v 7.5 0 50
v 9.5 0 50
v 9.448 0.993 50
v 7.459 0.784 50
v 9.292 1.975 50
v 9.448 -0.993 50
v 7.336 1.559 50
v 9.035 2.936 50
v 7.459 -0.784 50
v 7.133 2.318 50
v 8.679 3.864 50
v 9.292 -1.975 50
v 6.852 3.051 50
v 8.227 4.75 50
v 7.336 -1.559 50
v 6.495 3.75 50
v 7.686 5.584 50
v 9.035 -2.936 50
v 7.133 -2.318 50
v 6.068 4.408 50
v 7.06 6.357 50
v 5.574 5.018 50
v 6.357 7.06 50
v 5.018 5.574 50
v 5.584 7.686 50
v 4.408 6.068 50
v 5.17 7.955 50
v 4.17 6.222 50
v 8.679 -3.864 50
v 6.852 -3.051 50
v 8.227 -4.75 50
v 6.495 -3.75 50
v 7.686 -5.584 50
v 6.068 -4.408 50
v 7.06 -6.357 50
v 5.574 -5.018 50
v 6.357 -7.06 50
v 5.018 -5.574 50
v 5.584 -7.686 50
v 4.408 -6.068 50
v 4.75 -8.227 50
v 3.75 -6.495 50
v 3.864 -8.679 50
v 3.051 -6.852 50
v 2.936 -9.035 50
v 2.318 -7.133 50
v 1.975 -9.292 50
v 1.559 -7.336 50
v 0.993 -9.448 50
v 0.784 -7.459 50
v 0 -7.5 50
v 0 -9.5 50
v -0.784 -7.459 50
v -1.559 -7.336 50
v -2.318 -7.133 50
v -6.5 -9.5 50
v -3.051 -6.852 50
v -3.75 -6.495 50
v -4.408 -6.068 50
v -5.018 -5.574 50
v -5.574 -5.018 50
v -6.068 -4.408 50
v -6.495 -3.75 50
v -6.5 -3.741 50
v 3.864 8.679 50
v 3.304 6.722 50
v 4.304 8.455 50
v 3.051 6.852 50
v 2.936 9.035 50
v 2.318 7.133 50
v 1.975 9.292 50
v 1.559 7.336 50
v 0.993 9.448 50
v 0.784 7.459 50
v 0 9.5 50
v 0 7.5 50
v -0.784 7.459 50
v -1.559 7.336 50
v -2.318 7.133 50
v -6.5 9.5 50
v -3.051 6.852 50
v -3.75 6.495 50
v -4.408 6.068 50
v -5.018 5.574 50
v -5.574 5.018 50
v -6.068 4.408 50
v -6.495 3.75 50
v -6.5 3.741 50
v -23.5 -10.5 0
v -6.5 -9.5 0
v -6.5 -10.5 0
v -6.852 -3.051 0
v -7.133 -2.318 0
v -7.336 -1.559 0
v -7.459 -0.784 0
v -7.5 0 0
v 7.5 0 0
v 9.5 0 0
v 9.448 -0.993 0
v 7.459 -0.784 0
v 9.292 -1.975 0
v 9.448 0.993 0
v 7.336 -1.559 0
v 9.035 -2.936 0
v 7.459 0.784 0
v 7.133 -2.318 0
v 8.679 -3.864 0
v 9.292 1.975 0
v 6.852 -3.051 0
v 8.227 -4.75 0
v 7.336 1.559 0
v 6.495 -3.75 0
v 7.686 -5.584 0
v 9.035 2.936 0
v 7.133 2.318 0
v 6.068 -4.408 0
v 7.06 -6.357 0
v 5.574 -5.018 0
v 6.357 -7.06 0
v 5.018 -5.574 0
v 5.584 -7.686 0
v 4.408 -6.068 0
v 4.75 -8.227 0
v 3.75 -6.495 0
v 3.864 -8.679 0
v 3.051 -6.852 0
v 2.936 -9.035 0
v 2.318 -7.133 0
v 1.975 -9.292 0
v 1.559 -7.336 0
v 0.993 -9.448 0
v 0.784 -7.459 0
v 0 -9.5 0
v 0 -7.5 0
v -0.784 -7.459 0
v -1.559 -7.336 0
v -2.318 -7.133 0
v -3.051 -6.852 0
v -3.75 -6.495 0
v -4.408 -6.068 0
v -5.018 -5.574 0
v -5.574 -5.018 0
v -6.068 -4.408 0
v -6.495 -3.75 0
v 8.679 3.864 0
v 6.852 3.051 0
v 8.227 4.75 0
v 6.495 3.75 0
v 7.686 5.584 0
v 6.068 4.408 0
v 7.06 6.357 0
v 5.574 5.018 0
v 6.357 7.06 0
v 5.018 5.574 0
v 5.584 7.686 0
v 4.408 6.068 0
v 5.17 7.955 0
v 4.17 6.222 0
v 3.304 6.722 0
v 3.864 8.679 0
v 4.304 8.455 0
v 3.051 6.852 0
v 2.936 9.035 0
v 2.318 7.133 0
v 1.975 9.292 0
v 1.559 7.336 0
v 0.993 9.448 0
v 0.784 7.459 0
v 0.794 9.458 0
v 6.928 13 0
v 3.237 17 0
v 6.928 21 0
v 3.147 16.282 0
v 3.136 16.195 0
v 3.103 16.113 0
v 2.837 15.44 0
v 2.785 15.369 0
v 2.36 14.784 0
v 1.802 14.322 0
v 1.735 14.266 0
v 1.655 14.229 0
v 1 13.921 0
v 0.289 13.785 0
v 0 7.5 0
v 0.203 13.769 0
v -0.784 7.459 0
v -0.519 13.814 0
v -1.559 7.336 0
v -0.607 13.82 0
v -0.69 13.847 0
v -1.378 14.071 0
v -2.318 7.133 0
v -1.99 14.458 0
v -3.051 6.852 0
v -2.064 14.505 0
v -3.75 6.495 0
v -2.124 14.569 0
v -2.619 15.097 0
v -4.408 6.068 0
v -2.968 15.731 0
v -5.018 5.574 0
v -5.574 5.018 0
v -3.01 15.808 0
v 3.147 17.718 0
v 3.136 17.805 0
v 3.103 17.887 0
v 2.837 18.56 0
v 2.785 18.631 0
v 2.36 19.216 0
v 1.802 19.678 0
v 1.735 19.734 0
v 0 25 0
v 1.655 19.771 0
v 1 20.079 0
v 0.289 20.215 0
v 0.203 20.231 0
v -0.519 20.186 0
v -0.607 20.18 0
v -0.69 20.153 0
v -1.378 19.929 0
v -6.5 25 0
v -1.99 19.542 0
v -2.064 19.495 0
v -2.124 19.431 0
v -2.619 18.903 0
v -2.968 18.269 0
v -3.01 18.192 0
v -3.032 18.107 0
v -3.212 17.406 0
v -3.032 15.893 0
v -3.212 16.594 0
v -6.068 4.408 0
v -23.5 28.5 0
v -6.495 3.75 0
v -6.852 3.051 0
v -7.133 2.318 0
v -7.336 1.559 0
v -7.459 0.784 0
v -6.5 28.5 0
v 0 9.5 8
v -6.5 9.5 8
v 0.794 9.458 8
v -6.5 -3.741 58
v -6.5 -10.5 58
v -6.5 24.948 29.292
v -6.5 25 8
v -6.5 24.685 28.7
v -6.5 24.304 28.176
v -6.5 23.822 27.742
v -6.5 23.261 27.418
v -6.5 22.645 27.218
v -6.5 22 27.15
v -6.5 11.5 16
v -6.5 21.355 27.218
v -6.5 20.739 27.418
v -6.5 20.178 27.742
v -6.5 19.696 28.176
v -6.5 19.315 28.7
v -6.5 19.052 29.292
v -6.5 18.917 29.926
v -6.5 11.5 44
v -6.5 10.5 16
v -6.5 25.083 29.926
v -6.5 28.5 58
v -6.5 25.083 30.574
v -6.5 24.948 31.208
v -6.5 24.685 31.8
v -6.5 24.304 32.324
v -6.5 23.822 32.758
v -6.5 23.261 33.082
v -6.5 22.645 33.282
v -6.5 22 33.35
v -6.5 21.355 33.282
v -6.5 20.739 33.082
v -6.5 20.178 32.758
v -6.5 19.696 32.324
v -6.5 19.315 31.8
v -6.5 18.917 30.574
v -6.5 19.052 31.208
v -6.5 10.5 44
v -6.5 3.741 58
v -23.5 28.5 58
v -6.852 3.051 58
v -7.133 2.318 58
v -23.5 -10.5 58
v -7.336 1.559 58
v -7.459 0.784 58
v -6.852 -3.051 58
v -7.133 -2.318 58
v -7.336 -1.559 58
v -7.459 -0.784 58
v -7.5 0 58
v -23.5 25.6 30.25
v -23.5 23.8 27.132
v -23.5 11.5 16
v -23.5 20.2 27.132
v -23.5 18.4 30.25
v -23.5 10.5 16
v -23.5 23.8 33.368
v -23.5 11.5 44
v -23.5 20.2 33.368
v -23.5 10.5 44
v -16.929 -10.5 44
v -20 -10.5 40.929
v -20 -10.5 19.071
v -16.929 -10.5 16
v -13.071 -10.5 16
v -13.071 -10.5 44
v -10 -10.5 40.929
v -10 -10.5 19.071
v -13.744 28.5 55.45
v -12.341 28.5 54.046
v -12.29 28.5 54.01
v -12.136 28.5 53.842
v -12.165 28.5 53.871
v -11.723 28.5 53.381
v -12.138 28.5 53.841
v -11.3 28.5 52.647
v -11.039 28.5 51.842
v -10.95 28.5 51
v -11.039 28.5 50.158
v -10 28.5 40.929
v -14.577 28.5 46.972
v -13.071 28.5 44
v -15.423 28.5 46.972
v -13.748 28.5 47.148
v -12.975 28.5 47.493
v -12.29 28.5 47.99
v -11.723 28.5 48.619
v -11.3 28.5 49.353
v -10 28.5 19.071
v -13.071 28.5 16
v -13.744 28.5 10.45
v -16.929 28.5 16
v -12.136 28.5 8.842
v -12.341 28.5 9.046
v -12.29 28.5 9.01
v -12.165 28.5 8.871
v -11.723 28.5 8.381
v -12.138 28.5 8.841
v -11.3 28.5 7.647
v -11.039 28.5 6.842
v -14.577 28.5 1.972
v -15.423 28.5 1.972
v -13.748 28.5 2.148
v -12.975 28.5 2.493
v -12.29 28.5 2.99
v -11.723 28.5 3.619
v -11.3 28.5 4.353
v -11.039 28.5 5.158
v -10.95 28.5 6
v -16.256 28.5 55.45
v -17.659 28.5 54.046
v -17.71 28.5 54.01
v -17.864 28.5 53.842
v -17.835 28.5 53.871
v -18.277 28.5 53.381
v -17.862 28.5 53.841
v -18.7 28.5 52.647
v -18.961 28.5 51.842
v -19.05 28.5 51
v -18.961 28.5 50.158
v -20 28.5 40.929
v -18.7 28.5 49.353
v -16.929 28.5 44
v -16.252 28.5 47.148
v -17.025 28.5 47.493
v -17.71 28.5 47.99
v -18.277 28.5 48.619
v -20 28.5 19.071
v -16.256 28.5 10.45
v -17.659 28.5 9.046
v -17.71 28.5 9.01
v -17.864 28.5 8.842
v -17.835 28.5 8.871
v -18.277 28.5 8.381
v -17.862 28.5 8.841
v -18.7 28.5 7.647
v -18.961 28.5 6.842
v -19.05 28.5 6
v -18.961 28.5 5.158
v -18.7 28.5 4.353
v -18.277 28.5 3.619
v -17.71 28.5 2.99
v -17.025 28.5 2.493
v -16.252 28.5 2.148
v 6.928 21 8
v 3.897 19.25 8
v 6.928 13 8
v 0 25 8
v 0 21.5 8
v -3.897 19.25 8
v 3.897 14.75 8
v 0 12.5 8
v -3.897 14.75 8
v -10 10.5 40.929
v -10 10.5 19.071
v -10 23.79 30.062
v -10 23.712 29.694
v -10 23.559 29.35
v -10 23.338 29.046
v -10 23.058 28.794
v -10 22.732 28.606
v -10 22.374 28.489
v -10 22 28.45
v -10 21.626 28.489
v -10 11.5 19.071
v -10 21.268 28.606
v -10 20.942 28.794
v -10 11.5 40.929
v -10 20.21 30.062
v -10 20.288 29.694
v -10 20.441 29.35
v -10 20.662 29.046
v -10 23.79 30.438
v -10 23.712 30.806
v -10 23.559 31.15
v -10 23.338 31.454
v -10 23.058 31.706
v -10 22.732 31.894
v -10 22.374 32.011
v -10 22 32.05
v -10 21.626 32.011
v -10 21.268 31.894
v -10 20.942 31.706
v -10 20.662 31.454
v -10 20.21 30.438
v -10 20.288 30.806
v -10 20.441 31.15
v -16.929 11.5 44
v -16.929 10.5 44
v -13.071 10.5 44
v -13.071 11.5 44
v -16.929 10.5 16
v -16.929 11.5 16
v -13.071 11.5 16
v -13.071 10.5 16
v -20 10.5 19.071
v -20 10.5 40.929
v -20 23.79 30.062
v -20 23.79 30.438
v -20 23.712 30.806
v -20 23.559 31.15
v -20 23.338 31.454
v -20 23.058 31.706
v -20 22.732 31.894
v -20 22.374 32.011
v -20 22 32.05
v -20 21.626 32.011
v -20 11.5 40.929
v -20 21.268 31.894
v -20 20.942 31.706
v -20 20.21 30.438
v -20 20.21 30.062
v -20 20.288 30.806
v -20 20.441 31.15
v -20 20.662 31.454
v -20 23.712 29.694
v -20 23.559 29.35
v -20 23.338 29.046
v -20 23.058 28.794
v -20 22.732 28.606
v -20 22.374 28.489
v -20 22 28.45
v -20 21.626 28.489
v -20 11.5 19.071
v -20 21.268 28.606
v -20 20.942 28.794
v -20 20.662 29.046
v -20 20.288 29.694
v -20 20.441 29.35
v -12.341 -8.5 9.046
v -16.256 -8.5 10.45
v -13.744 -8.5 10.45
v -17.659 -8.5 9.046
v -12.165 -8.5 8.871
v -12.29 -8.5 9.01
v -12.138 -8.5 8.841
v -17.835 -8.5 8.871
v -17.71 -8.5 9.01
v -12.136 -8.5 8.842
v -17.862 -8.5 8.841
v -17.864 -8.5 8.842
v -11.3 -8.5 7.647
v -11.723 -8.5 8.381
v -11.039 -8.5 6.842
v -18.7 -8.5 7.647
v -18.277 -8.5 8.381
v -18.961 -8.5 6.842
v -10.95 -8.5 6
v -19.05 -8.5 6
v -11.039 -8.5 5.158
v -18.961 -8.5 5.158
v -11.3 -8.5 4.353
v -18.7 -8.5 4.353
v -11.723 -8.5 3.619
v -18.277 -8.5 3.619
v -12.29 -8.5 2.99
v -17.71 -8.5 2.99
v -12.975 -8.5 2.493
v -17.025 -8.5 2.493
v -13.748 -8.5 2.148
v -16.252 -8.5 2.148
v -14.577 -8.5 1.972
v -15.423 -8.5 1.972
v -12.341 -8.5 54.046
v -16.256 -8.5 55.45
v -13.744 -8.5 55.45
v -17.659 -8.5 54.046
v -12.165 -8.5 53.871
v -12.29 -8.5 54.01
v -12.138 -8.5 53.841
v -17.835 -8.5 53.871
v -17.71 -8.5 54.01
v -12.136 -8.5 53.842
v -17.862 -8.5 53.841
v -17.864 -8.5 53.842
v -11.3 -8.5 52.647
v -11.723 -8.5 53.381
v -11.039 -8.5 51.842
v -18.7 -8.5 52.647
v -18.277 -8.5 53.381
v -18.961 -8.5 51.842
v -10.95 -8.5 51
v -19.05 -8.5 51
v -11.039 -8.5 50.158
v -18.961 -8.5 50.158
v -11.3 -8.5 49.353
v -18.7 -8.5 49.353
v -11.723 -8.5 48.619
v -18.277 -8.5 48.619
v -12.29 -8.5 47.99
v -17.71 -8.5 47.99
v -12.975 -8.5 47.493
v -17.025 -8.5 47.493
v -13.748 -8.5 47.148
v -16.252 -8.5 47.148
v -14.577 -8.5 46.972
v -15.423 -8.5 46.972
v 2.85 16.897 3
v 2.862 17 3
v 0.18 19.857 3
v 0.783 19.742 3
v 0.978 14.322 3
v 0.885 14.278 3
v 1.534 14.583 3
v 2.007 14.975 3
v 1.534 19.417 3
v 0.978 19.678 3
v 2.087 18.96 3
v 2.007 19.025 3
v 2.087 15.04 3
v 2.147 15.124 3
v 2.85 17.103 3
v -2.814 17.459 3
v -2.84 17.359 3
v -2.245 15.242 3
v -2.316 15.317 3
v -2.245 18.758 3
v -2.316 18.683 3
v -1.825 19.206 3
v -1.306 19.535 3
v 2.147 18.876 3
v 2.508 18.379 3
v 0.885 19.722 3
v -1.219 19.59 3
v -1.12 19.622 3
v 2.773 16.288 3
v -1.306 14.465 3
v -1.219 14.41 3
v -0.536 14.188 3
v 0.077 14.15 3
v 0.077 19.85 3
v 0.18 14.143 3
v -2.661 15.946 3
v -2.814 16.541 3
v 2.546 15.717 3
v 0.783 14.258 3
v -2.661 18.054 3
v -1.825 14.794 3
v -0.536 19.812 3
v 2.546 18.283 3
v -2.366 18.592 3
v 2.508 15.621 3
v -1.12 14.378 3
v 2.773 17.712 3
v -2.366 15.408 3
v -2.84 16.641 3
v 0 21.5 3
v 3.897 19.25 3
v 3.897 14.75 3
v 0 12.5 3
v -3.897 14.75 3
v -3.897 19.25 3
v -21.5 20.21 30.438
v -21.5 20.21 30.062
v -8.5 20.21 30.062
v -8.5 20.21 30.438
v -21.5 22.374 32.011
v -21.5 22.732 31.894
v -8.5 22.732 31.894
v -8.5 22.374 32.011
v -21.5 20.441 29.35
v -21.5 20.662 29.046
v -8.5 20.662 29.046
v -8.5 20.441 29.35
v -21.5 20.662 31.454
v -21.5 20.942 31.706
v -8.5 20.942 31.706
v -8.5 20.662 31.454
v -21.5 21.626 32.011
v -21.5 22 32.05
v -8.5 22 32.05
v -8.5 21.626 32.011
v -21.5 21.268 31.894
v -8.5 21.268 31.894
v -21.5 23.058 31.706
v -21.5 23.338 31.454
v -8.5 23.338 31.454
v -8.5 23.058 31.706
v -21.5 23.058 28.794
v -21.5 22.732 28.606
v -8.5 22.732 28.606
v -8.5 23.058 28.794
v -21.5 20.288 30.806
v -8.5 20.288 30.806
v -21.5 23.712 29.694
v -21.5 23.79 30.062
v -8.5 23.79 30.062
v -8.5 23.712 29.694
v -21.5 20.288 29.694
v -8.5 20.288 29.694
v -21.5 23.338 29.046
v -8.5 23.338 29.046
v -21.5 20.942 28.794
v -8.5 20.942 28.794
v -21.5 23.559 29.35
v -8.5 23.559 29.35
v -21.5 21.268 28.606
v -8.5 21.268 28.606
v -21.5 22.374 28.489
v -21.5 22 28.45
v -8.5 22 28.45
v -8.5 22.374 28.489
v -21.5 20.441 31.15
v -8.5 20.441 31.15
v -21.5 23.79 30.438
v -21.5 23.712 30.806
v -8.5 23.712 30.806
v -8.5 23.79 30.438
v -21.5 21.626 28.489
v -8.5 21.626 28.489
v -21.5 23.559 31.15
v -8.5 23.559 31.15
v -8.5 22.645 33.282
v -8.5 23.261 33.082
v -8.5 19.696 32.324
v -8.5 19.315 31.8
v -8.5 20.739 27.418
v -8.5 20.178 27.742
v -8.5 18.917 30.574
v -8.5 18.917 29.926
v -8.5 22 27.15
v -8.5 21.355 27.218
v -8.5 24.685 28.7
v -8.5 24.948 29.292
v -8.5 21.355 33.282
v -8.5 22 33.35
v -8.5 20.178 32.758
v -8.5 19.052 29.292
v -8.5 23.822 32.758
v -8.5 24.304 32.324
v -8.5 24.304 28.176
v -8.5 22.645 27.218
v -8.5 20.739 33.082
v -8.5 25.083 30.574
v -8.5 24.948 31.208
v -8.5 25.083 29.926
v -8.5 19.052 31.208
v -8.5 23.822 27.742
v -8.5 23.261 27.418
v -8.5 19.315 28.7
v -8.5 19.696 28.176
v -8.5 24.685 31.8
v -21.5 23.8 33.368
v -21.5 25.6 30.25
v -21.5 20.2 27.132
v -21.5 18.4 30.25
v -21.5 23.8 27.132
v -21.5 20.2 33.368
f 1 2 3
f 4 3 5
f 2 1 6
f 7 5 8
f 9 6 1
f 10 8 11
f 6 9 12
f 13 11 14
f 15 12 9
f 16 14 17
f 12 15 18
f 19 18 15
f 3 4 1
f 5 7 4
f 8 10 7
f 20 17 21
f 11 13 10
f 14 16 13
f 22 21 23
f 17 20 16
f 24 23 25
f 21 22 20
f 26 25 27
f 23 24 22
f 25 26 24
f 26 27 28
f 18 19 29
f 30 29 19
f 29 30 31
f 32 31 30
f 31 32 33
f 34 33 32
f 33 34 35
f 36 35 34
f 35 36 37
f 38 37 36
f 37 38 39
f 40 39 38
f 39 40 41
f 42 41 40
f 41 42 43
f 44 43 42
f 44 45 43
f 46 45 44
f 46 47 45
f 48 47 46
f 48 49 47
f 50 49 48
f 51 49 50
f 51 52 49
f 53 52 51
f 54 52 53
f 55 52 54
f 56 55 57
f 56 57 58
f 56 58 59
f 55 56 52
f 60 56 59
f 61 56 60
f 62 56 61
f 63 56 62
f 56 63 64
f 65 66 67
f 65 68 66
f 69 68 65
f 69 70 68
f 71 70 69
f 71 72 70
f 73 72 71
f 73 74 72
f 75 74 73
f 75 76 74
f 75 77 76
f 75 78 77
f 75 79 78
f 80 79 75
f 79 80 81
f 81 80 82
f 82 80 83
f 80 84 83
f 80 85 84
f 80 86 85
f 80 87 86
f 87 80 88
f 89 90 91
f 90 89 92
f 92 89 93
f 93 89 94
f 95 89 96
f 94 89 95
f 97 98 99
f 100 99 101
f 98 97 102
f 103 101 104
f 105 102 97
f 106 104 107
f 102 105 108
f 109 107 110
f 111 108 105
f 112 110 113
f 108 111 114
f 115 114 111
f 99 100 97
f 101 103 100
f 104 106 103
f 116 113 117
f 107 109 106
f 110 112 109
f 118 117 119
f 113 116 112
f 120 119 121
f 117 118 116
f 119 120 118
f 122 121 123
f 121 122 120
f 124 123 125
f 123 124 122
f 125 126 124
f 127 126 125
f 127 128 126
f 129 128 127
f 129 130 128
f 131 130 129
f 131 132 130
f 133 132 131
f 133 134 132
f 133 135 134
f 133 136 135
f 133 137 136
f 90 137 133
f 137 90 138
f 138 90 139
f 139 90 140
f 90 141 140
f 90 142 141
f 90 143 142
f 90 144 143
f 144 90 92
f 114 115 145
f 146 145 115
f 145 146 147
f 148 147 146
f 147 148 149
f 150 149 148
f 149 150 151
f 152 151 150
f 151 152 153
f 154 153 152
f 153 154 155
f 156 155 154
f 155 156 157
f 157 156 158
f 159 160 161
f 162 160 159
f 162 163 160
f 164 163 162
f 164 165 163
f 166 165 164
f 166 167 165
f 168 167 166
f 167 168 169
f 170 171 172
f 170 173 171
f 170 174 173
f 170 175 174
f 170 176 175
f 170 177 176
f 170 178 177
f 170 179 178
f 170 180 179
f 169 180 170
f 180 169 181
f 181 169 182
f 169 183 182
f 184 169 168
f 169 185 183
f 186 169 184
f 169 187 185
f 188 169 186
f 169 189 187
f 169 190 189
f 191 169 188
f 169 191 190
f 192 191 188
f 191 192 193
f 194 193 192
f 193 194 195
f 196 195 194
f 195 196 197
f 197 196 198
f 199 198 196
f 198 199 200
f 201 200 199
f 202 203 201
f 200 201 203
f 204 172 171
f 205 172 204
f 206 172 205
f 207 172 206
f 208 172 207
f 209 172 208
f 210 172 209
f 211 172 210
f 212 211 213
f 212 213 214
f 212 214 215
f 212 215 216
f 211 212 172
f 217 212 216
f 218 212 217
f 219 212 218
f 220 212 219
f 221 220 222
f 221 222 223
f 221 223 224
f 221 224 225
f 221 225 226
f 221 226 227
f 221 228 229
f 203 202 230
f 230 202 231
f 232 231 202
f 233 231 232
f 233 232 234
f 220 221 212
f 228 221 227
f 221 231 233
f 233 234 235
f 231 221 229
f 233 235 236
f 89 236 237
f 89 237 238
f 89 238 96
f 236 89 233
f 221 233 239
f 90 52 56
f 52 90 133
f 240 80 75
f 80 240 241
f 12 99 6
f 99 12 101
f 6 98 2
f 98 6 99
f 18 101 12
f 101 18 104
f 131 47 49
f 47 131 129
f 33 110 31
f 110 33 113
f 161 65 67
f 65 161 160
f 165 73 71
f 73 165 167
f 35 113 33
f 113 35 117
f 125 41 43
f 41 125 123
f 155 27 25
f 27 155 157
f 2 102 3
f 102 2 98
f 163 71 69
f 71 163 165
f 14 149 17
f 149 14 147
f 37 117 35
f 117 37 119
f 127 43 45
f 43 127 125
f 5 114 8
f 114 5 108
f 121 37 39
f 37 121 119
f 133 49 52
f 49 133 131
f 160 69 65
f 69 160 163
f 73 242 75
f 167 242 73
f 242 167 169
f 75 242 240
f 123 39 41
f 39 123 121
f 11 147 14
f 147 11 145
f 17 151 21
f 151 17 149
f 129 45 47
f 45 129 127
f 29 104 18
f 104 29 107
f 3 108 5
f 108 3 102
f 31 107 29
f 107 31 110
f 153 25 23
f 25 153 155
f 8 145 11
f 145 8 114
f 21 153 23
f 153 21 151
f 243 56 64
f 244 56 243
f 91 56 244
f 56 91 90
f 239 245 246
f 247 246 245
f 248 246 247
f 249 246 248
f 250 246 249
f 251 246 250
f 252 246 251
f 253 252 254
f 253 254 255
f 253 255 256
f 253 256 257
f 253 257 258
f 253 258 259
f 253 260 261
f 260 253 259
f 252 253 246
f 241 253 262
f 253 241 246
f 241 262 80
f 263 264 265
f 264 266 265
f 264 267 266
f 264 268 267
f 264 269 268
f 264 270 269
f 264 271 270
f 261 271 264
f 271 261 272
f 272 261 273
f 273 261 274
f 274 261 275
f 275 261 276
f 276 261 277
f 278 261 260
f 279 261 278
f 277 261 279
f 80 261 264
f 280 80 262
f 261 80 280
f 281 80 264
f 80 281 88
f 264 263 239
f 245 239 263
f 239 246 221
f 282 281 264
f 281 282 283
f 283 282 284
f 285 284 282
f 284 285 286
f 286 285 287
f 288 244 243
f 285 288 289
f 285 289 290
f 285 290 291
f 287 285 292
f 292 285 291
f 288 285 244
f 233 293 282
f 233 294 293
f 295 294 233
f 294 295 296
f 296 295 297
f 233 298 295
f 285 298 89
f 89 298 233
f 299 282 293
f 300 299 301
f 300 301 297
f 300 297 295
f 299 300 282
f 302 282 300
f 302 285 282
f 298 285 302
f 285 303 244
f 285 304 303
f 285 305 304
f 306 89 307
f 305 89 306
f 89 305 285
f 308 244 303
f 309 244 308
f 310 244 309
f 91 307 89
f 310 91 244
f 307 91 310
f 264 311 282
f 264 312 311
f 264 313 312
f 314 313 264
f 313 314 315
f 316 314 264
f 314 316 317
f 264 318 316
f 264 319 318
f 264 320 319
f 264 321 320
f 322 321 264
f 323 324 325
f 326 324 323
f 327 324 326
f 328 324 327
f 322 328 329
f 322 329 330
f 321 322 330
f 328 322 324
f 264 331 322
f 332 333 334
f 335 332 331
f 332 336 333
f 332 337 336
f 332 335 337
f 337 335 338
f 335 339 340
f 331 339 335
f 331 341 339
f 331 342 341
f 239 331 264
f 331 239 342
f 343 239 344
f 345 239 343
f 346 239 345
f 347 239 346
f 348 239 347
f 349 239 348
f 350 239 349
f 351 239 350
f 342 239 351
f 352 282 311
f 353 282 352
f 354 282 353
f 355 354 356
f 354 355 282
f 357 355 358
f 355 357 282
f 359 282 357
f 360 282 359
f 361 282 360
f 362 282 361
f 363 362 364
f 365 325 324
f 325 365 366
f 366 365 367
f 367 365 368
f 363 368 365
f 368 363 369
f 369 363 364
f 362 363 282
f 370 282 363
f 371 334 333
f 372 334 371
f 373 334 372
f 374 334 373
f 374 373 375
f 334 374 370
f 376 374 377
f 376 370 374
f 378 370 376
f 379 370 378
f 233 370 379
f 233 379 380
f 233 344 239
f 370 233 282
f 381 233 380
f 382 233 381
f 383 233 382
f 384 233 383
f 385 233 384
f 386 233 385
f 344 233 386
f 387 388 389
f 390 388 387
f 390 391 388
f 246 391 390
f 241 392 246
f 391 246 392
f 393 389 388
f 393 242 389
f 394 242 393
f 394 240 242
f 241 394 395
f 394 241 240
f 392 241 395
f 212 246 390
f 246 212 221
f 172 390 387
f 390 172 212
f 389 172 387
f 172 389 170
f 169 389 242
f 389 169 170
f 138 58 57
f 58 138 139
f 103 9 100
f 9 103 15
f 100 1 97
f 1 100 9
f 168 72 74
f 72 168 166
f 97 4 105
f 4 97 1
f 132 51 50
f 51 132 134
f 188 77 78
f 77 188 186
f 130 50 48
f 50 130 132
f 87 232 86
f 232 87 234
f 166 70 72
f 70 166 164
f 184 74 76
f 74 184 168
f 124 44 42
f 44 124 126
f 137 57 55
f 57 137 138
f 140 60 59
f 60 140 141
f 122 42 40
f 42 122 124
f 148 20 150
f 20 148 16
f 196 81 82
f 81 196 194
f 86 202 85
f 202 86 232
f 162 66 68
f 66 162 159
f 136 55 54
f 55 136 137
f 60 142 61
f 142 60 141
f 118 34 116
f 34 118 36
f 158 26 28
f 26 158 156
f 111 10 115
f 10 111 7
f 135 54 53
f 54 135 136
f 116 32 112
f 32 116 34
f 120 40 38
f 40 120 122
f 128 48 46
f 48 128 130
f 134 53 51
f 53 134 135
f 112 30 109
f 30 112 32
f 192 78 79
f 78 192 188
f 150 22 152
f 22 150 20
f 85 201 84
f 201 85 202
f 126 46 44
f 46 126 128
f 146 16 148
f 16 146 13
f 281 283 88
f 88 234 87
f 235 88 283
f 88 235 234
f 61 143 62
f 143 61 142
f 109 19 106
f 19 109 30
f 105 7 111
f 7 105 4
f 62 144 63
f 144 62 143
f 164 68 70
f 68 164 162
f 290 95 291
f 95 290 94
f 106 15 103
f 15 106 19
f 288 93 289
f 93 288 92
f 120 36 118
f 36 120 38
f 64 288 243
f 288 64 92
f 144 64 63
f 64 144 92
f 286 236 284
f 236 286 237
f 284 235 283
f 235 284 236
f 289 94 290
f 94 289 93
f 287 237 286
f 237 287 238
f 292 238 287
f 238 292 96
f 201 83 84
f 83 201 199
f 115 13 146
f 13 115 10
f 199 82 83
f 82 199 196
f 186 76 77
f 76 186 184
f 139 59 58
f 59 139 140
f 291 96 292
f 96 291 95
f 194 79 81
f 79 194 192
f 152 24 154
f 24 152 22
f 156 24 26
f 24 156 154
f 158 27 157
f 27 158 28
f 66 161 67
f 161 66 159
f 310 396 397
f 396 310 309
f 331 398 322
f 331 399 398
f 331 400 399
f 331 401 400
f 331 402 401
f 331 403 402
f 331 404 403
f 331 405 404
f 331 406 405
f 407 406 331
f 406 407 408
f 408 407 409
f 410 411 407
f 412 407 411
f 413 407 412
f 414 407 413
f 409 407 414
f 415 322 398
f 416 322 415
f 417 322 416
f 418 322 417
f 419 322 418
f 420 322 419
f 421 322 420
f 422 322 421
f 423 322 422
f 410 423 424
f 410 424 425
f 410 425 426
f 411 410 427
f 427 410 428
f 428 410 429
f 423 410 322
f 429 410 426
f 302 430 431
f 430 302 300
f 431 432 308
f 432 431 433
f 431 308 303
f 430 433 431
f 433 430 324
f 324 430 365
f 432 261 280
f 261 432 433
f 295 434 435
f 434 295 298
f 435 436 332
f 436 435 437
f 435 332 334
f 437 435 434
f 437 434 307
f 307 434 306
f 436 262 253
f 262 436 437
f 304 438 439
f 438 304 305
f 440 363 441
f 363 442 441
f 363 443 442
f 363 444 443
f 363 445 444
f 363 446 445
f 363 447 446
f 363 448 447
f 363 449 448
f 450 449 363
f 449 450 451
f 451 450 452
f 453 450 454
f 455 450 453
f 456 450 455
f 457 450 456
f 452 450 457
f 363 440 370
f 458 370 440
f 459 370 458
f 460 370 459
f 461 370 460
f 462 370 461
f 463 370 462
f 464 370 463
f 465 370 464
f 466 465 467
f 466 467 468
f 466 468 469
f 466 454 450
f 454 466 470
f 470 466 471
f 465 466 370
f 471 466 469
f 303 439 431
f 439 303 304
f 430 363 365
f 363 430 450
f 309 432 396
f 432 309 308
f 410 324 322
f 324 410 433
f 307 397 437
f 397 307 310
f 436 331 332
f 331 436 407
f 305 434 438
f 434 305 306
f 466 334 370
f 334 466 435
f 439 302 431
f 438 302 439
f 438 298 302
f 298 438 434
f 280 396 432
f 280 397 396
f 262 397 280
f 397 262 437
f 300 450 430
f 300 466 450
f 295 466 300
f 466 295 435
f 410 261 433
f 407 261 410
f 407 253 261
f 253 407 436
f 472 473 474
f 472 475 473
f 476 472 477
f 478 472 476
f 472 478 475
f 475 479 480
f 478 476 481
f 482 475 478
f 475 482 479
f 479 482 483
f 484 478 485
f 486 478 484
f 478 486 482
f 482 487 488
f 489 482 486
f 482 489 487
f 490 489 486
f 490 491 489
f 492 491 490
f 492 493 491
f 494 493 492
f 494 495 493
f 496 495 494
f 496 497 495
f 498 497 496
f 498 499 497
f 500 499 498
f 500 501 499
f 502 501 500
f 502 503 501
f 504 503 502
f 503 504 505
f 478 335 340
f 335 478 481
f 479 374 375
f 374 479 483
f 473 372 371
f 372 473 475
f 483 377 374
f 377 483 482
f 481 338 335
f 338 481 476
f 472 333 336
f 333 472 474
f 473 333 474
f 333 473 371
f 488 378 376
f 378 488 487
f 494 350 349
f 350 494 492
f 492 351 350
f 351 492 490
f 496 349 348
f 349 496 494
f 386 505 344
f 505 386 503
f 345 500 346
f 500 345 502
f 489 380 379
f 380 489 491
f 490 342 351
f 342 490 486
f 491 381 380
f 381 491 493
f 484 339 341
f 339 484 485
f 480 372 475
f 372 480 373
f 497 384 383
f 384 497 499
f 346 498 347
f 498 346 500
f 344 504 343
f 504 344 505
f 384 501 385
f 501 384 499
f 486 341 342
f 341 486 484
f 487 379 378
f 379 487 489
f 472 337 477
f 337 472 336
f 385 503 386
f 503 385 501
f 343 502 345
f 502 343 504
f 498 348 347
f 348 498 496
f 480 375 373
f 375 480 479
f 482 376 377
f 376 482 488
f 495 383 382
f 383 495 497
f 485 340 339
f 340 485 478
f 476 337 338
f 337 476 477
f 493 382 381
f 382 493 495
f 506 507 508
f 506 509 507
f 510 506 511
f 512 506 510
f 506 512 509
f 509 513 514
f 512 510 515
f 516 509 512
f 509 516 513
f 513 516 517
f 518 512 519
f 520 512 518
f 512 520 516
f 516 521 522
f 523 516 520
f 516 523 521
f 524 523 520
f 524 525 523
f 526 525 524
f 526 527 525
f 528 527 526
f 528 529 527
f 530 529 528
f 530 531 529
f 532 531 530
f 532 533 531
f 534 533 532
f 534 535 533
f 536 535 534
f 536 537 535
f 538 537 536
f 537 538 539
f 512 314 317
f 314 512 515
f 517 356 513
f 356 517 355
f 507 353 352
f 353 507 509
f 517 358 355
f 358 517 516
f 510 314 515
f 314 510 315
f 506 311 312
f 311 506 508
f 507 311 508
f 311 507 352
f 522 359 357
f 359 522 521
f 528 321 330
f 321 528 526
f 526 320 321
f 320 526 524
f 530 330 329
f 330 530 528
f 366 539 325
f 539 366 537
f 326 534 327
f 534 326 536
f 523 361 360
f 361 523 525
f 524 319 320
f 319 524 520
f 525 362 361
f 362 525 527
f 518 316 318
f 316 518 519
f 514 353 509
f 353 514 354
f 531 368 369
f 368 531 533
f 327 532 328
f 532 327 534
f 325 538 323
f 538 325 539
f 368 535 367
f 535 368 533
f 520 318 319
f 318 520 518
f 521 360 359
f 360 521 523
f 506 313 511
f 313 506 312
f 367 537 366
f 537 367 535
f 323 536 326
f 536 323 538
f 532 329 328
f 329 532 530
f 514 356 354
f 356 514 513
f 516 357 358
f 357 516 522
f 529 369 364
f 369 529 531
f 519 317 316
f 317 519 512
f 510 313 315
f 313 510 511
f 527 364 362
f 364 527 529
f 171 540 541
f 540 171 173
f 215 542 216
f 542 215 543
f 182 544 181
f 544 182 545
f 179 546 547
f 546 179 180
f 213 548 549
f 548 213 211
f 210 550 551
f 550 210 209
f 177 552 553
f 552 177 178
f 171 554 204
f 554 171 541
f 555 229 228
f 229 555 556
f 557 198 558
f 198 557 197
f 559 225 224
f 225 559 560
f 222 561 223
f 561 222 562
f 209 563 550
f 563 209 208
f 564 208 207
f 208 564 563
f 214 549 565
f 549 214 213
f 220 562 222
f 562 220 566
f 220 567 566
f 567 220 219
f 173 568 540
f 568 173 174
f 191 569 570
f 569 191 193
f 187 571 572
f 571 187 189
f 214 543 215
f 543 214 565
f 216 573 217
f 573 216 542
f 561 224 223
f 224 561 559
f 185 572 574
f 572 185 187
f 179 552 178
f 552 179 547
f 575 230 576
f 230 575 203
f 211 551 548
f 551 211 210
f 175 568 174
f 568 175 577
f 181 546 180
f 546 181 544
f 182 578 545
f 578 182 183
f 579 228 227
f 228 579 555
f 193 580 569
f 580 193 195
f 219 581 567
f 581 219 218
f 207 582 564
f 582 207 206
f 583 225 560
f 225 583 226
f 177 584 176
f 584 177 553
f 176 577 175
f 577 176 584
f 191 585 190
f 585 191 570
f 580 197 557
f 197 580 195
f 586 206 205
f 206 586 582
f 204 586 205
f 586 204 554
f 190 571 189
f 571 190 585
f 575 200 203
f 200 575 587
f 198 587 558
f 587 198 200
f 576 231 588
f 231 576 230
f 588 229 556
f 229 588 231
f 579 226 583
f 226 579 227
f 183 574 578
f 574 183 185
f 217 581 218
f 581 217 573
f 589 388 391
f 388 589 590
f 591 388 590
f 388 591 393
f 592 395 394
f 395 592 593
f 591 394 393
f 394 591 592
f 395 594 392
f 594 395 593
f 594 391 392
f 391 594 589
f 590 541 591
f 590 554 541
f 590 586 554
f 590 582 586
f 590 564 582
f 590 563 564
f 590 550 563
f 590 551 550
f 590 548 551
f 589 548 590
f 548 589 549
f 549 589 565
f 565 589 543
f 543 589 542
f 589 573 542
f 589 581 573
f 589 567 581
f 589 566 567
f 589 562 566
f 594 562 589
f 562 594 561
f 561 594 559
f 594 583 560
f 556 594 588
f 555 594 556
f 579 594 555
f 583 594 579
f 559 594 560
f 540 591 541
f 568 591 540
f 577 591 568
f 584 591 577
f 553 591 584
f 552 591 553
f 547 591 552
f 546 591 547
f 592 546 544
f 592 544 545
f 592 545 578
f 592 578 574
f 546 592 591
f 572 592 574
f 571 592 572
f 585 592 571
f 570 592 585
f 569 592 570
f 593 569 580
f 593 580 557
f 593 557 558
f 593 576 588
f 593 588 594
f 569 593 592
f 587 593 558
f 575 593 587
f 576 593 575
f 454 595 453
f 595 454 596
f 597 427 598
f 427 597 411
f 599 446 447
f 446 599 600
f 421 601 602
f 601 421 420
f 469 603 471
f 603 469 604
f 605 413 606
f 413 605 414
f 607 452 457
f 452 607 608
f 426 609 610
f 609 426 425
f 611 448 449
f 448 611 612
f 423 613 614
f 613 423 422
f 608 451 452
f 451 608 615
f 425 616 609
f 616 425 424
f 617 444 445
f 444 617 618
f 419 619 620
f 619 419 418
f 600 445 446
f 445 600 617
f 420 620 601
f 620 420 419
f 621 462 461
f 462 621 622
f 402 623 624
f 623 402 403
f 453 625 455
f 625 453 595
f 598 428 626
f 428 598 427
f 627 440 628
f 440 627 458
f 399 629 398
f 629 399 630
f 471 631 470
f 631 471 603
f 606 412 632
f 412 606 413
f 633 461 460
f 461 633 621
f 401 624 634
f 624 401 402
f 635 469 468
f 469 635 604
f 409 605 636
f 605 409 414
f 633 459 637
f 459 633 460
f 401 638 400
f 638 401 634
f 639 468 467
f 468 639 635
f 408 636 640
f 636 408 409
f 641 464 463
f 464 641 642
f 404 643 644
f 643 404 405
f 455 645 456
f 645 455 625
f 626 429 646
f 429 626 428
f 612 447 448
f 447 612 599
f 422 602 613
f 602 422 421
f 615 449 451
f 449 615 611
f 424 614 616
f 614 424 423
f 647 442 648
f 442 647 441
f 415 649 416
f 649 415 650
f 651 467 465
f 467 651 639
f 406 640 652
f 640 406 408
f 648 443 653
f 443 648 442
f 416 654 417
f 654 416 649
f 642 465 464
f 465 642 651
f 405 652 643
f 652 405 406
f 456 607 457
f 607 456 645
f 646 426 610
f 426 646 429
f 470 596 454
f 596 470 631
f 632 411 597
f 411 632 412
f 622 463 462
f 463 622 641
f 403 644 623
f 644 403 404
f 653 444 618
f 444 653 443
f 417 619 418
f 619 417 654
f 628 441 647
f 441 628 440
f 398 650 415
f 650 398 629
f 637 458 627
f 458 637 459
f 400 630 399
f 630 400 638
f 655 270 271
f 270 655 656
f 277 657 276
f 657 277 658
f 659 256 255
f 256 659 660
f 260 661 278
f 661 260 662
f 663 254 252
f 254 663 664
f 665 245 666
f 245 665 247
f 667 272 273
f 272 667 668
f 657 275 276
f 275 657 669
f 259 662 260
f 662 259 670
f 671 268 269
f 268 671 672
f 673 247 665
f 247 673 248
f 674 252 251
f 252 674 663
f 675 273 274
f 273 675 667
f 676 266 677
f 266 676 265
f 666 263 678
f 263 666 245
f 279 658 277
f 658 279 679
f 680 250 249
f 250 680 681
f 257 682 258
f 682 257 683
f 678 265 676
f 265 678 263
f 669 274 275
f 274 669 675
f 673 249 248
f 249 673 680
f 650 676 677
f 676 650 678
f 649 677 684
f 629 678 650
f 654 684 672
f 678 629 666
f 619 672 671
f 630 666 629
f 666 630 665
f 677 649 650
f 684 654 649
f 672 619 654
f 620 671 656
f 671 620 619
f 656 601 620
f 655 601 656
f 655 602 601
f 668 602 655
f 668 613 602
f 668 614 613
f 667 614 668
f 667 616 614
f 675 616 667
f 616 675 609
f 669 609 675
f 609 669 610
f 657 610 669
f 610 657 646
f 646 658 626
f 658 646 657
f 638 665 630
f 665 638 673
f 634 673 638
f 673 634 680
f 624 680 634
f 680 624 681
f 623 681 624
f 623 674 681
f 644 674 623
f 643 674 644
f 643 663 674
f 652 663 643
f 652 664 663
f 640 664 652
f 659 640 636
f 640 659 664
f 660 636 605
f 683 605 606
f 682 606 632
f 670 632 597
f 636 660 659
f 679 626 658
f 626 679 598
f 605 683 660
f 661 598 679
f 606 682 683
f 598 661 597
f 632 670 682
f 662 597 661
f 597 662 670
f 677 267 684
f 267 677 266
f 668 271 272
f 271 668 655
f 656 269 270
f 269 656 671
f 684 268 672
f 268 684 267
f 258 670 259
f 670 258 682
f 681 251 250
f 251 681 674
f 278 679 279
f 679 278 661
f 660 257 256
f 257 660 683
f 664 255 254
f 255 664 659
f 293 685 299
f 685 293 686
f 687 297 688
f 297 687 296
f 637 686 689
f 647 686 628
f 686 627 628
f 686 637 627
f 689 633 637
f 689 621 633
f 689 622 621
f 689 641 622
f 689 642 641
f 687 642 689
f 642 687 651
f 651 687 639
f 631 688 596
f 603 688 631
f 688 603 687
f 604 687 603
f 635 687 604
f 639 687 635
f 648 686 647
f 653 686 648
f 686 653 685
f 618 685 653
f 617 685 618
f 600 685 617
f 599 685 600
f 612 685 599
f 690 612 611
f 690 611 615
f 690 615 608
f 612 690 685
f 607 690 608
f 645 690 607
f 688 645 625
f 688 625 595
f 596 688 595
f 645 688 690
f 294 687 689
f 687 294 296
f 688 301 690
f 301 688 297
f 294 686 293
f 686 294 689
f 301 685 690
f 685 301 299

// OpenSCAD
// file: inc/inc/bearing.scad
// PRUSA iteration3
// Bearing holders
// GNU GPL v3
// Josef Průša <iam@josefprusa.cz> and contributors
// http://www.reprap.org/wiki/Prusa_Mendel
// http://prusamendel.org

bearing_diameter = 15;

module horizontal_bearing_base(bearings=1){
 translate(v=[0,0,8/2]) cube(size = [24,8+bearings*25,8], center = true);	
}
module horizontal_bearing_holes(bearings=1){
 cutter_lenght = 10+bearings*25;
 one_holder_lenght = 8+25;
 holder_lenght = 8+bearings*25;
 
 // Main bearing cut
 difference(){
  translate(v=[0,0,12]) rotate(a=[90,0,0]) translate(v=[0,0,-cutter_lenght/2]) cylinder(h = cutter_lenght, r=bearing_diameter/2, $fn=50);
  // Bearing retainers
  translate(v=[0,1-holder_lenght/2,3]) cube(size = [24,6,8], center = true);
  translate(v=[0,-1+holder_lenght/2,3]) cube(size = [24,6,8], center = true);
 }
 
 // Ziptie cutouts
 ziptie_cut_ofset = 0;
 for ( i = [0 : bearings-1] ){
  // For easier positioning I move them by half of one 
  // bearing holder then add each bearign lenght and then center again
  translate(v=[0,-holder_lenght/2,0]) translate(v=[0,one_holder_lenght/2+i*25,0]) difference(){
   union(){
    translate(v=[0,2-6,12]) rotate(a=[90,0,0]) translate(v=[0,0,0]) cylinder(h = 4, r=12.5, $fn=50);
    translate(v=[0,2+6,12]) rotate(a=[90,0,0]) translate(v=[0,0,0]) cylinder(h = 4, r=12.5, $fn=50);
   }
   translate(v=[0,10,12]) rotate(a=[90,0,0]) translate(v=[0,0,0]) cylinder(h = 24, r=10, $fn=50);
  }
 }
 
}

*difference() {
horizontal_bearing_base();
horizontal_bearing_holes();
}

module horizontal_bearing_test(){
 difference(){
  horizontal_bearing_base(1);
  horizontal_bearing_holes(1);
 }
 translate(v=[30,0,0]) difference(){
  horizontal_bearing_base(2);
  horizontal_bearing_holes(2);
 }
 translate(v=[60,0,0]) difference(){
  horizontal_bearing_base(3);
  horizontal_bearing_holes(3);
 }
}


vertical_bearing_height = 50;

thinwall = 2;
bearing_size = bearing_diameter + 2 * thinwall;

module vertical_bearing_base(){
 translate(v=[-2-bearing_size/4,0,vertical_bearing_height/2]) cube(size = [4+bearing_size/2,bearing_size,vertical_bearing_height], center = true);
 cylinder(h = vertical_bearing_height, r=bearing_size/2, $fn = 60);
}

module vertical_bearing_holes(){
  translate(v=[0,0,-1]) cylinder(h = vertical_bearing_height+10, r=bearing_diameter/2, $fn = 60);
  rotate(a=[0,0,-60]) translate(v=[10,0,vertical_bearing_height/2+1]) cube(size = [10,1,vertical_bearing_height+2], center = true);
}

difference(){
vertical_bearing_base();
vertical_bearing_holes();
}
// file: inc/x-end.scad
// PRUSA iteration3
// X end prototype
// GNU GPL v3
// Josef Průša <iam@josefprusa.cz> and contributors
// http://www.reprap.org/wiki/Prusa_Mendel
// http://prusamendel.org

use <inc/bearing.scad>
rod_distance = 45;

module x_end_base(){
// Main block
height = 58;
translate(v=[-15,-9,height/2]) cube(size = [17,39,height], center = true);
// Bearing holder
 vertical_bearing_base();	
//Nut trap
 // Cube
 translate(v=[-2-2,-17,4]) cube(size = [8,16,8], center = true);
 // Hexagon
 translate(v=[0,-17,0]) rotate([0,0,30]) cylinder(h = 8, r=8, $fn = 6);
}

module x_end_holes(){
 vertical_bearing_holes();
// Belt hole
translate(v=[-1,0,0]){
// Stress relief
translate(v=[-5.5-10+1.5,-10-1,30]) cube(size = [20,1,28], center = true);
difference(){
	translate(v=[-5.5-10+1.5,-10,30]) cube(size = [10,46,28], center = true);

	

	// Nice edges
	translate(v=[-5.5-10+1.5,-10,30+23]) rotate([0,45,0]) cube(size = [10,46,28], center = true);
	translate(v=[-5.5-10+1.5,-10,30+23]) rotate([0,-45,0]) cube(size = [10,46,28], center = true);
	translate(v=[-5.5-10+1.5,-10,30-23]) rotate([0,45,0]) cube(size = [10,46,28], center = true);
	translate(v=[-5.5-10+1.5,-10,30-23]) rotate([0,-45,0]) cube(size = [10,46,28], center = true);

}
}

// Bottom pushfit rod
translate(v=[-15,-41.5,6]) rotate(a=[-90,0,0]) pushfit_rod(8.1,50);
// Top pushfit rod
translate(v=[-15,-41.5,rod_distance+6]) rotate(a=[-90,0,0]) pushfit_rod(8.1,50);
// Nut trap
 translate(v=[0,-17,-0.5]) cylinder(h = 4, r1=3.3, r2=2.8, $fn=25);
 translate(v=[0,-17,3]) rotate([0,0,30]) cylinder(h = 10, r=4.5, $fn = 6);
}


// Final prototype
module x_end_plain(){
 difference(){
  x_end_base();
  x_end_holes();
 }
}

x_end_plain();


module pushfit_rod(diameter,length){
 cylinder(h = length, r=diameter/2, $fn=30);
 difference(){
 	translate(v=[0,-diameter/2.85,length/2]) rotate([0,0,45]) cube(size = [diameter/2,diameter/2,length], center = true);
 	translate(v=[0,-diameter/4-diameter/2-0.4,length/2]) rotate([0,0,0]) cube(size = [diameter,diameter/2,length], center = true);
 }
 //translate(v=[0,-diameter/2-2,length/2]) cube(size = [diameter,1,length], center = true);
}
// main file
// PRUSA iteration3
// X end idler
// GNU GPL v3
// Josef Průša <iam@josefprusa.cz> and contributors
// http://www.reprap.org/wiki/Prusa_Mendel
// http://prusamendel.org

use <inc/x-end.scad>

module x_end_idler_base(){
 x_end_base();
}

module x_end_idler_holes(){
 x_end_holes();
 translate(v=[0,-22,30.25]) rotate(a=[0,-90,0]) cylinder(h = 80, r=1.8, $fn=30);
 translate(v=[1.5,-22,30.25]) rotate(a=[0,-90,0]) cylinder(h = 10, r=3.1, $fn=30);
 translate(v=[-21.5,-22,30.25]) rotate(a=[0,-90,0]) rotate(a=[0,0,30]) cylinder(h = 80, r=3.6, $fn=6);
}
 
// Final part
module x_end_idler(){
 mirror([0,1,0]) difference(){
  x_end_idler_base();
  x_end_idler_holes();
 }
}

x_end_idler();
